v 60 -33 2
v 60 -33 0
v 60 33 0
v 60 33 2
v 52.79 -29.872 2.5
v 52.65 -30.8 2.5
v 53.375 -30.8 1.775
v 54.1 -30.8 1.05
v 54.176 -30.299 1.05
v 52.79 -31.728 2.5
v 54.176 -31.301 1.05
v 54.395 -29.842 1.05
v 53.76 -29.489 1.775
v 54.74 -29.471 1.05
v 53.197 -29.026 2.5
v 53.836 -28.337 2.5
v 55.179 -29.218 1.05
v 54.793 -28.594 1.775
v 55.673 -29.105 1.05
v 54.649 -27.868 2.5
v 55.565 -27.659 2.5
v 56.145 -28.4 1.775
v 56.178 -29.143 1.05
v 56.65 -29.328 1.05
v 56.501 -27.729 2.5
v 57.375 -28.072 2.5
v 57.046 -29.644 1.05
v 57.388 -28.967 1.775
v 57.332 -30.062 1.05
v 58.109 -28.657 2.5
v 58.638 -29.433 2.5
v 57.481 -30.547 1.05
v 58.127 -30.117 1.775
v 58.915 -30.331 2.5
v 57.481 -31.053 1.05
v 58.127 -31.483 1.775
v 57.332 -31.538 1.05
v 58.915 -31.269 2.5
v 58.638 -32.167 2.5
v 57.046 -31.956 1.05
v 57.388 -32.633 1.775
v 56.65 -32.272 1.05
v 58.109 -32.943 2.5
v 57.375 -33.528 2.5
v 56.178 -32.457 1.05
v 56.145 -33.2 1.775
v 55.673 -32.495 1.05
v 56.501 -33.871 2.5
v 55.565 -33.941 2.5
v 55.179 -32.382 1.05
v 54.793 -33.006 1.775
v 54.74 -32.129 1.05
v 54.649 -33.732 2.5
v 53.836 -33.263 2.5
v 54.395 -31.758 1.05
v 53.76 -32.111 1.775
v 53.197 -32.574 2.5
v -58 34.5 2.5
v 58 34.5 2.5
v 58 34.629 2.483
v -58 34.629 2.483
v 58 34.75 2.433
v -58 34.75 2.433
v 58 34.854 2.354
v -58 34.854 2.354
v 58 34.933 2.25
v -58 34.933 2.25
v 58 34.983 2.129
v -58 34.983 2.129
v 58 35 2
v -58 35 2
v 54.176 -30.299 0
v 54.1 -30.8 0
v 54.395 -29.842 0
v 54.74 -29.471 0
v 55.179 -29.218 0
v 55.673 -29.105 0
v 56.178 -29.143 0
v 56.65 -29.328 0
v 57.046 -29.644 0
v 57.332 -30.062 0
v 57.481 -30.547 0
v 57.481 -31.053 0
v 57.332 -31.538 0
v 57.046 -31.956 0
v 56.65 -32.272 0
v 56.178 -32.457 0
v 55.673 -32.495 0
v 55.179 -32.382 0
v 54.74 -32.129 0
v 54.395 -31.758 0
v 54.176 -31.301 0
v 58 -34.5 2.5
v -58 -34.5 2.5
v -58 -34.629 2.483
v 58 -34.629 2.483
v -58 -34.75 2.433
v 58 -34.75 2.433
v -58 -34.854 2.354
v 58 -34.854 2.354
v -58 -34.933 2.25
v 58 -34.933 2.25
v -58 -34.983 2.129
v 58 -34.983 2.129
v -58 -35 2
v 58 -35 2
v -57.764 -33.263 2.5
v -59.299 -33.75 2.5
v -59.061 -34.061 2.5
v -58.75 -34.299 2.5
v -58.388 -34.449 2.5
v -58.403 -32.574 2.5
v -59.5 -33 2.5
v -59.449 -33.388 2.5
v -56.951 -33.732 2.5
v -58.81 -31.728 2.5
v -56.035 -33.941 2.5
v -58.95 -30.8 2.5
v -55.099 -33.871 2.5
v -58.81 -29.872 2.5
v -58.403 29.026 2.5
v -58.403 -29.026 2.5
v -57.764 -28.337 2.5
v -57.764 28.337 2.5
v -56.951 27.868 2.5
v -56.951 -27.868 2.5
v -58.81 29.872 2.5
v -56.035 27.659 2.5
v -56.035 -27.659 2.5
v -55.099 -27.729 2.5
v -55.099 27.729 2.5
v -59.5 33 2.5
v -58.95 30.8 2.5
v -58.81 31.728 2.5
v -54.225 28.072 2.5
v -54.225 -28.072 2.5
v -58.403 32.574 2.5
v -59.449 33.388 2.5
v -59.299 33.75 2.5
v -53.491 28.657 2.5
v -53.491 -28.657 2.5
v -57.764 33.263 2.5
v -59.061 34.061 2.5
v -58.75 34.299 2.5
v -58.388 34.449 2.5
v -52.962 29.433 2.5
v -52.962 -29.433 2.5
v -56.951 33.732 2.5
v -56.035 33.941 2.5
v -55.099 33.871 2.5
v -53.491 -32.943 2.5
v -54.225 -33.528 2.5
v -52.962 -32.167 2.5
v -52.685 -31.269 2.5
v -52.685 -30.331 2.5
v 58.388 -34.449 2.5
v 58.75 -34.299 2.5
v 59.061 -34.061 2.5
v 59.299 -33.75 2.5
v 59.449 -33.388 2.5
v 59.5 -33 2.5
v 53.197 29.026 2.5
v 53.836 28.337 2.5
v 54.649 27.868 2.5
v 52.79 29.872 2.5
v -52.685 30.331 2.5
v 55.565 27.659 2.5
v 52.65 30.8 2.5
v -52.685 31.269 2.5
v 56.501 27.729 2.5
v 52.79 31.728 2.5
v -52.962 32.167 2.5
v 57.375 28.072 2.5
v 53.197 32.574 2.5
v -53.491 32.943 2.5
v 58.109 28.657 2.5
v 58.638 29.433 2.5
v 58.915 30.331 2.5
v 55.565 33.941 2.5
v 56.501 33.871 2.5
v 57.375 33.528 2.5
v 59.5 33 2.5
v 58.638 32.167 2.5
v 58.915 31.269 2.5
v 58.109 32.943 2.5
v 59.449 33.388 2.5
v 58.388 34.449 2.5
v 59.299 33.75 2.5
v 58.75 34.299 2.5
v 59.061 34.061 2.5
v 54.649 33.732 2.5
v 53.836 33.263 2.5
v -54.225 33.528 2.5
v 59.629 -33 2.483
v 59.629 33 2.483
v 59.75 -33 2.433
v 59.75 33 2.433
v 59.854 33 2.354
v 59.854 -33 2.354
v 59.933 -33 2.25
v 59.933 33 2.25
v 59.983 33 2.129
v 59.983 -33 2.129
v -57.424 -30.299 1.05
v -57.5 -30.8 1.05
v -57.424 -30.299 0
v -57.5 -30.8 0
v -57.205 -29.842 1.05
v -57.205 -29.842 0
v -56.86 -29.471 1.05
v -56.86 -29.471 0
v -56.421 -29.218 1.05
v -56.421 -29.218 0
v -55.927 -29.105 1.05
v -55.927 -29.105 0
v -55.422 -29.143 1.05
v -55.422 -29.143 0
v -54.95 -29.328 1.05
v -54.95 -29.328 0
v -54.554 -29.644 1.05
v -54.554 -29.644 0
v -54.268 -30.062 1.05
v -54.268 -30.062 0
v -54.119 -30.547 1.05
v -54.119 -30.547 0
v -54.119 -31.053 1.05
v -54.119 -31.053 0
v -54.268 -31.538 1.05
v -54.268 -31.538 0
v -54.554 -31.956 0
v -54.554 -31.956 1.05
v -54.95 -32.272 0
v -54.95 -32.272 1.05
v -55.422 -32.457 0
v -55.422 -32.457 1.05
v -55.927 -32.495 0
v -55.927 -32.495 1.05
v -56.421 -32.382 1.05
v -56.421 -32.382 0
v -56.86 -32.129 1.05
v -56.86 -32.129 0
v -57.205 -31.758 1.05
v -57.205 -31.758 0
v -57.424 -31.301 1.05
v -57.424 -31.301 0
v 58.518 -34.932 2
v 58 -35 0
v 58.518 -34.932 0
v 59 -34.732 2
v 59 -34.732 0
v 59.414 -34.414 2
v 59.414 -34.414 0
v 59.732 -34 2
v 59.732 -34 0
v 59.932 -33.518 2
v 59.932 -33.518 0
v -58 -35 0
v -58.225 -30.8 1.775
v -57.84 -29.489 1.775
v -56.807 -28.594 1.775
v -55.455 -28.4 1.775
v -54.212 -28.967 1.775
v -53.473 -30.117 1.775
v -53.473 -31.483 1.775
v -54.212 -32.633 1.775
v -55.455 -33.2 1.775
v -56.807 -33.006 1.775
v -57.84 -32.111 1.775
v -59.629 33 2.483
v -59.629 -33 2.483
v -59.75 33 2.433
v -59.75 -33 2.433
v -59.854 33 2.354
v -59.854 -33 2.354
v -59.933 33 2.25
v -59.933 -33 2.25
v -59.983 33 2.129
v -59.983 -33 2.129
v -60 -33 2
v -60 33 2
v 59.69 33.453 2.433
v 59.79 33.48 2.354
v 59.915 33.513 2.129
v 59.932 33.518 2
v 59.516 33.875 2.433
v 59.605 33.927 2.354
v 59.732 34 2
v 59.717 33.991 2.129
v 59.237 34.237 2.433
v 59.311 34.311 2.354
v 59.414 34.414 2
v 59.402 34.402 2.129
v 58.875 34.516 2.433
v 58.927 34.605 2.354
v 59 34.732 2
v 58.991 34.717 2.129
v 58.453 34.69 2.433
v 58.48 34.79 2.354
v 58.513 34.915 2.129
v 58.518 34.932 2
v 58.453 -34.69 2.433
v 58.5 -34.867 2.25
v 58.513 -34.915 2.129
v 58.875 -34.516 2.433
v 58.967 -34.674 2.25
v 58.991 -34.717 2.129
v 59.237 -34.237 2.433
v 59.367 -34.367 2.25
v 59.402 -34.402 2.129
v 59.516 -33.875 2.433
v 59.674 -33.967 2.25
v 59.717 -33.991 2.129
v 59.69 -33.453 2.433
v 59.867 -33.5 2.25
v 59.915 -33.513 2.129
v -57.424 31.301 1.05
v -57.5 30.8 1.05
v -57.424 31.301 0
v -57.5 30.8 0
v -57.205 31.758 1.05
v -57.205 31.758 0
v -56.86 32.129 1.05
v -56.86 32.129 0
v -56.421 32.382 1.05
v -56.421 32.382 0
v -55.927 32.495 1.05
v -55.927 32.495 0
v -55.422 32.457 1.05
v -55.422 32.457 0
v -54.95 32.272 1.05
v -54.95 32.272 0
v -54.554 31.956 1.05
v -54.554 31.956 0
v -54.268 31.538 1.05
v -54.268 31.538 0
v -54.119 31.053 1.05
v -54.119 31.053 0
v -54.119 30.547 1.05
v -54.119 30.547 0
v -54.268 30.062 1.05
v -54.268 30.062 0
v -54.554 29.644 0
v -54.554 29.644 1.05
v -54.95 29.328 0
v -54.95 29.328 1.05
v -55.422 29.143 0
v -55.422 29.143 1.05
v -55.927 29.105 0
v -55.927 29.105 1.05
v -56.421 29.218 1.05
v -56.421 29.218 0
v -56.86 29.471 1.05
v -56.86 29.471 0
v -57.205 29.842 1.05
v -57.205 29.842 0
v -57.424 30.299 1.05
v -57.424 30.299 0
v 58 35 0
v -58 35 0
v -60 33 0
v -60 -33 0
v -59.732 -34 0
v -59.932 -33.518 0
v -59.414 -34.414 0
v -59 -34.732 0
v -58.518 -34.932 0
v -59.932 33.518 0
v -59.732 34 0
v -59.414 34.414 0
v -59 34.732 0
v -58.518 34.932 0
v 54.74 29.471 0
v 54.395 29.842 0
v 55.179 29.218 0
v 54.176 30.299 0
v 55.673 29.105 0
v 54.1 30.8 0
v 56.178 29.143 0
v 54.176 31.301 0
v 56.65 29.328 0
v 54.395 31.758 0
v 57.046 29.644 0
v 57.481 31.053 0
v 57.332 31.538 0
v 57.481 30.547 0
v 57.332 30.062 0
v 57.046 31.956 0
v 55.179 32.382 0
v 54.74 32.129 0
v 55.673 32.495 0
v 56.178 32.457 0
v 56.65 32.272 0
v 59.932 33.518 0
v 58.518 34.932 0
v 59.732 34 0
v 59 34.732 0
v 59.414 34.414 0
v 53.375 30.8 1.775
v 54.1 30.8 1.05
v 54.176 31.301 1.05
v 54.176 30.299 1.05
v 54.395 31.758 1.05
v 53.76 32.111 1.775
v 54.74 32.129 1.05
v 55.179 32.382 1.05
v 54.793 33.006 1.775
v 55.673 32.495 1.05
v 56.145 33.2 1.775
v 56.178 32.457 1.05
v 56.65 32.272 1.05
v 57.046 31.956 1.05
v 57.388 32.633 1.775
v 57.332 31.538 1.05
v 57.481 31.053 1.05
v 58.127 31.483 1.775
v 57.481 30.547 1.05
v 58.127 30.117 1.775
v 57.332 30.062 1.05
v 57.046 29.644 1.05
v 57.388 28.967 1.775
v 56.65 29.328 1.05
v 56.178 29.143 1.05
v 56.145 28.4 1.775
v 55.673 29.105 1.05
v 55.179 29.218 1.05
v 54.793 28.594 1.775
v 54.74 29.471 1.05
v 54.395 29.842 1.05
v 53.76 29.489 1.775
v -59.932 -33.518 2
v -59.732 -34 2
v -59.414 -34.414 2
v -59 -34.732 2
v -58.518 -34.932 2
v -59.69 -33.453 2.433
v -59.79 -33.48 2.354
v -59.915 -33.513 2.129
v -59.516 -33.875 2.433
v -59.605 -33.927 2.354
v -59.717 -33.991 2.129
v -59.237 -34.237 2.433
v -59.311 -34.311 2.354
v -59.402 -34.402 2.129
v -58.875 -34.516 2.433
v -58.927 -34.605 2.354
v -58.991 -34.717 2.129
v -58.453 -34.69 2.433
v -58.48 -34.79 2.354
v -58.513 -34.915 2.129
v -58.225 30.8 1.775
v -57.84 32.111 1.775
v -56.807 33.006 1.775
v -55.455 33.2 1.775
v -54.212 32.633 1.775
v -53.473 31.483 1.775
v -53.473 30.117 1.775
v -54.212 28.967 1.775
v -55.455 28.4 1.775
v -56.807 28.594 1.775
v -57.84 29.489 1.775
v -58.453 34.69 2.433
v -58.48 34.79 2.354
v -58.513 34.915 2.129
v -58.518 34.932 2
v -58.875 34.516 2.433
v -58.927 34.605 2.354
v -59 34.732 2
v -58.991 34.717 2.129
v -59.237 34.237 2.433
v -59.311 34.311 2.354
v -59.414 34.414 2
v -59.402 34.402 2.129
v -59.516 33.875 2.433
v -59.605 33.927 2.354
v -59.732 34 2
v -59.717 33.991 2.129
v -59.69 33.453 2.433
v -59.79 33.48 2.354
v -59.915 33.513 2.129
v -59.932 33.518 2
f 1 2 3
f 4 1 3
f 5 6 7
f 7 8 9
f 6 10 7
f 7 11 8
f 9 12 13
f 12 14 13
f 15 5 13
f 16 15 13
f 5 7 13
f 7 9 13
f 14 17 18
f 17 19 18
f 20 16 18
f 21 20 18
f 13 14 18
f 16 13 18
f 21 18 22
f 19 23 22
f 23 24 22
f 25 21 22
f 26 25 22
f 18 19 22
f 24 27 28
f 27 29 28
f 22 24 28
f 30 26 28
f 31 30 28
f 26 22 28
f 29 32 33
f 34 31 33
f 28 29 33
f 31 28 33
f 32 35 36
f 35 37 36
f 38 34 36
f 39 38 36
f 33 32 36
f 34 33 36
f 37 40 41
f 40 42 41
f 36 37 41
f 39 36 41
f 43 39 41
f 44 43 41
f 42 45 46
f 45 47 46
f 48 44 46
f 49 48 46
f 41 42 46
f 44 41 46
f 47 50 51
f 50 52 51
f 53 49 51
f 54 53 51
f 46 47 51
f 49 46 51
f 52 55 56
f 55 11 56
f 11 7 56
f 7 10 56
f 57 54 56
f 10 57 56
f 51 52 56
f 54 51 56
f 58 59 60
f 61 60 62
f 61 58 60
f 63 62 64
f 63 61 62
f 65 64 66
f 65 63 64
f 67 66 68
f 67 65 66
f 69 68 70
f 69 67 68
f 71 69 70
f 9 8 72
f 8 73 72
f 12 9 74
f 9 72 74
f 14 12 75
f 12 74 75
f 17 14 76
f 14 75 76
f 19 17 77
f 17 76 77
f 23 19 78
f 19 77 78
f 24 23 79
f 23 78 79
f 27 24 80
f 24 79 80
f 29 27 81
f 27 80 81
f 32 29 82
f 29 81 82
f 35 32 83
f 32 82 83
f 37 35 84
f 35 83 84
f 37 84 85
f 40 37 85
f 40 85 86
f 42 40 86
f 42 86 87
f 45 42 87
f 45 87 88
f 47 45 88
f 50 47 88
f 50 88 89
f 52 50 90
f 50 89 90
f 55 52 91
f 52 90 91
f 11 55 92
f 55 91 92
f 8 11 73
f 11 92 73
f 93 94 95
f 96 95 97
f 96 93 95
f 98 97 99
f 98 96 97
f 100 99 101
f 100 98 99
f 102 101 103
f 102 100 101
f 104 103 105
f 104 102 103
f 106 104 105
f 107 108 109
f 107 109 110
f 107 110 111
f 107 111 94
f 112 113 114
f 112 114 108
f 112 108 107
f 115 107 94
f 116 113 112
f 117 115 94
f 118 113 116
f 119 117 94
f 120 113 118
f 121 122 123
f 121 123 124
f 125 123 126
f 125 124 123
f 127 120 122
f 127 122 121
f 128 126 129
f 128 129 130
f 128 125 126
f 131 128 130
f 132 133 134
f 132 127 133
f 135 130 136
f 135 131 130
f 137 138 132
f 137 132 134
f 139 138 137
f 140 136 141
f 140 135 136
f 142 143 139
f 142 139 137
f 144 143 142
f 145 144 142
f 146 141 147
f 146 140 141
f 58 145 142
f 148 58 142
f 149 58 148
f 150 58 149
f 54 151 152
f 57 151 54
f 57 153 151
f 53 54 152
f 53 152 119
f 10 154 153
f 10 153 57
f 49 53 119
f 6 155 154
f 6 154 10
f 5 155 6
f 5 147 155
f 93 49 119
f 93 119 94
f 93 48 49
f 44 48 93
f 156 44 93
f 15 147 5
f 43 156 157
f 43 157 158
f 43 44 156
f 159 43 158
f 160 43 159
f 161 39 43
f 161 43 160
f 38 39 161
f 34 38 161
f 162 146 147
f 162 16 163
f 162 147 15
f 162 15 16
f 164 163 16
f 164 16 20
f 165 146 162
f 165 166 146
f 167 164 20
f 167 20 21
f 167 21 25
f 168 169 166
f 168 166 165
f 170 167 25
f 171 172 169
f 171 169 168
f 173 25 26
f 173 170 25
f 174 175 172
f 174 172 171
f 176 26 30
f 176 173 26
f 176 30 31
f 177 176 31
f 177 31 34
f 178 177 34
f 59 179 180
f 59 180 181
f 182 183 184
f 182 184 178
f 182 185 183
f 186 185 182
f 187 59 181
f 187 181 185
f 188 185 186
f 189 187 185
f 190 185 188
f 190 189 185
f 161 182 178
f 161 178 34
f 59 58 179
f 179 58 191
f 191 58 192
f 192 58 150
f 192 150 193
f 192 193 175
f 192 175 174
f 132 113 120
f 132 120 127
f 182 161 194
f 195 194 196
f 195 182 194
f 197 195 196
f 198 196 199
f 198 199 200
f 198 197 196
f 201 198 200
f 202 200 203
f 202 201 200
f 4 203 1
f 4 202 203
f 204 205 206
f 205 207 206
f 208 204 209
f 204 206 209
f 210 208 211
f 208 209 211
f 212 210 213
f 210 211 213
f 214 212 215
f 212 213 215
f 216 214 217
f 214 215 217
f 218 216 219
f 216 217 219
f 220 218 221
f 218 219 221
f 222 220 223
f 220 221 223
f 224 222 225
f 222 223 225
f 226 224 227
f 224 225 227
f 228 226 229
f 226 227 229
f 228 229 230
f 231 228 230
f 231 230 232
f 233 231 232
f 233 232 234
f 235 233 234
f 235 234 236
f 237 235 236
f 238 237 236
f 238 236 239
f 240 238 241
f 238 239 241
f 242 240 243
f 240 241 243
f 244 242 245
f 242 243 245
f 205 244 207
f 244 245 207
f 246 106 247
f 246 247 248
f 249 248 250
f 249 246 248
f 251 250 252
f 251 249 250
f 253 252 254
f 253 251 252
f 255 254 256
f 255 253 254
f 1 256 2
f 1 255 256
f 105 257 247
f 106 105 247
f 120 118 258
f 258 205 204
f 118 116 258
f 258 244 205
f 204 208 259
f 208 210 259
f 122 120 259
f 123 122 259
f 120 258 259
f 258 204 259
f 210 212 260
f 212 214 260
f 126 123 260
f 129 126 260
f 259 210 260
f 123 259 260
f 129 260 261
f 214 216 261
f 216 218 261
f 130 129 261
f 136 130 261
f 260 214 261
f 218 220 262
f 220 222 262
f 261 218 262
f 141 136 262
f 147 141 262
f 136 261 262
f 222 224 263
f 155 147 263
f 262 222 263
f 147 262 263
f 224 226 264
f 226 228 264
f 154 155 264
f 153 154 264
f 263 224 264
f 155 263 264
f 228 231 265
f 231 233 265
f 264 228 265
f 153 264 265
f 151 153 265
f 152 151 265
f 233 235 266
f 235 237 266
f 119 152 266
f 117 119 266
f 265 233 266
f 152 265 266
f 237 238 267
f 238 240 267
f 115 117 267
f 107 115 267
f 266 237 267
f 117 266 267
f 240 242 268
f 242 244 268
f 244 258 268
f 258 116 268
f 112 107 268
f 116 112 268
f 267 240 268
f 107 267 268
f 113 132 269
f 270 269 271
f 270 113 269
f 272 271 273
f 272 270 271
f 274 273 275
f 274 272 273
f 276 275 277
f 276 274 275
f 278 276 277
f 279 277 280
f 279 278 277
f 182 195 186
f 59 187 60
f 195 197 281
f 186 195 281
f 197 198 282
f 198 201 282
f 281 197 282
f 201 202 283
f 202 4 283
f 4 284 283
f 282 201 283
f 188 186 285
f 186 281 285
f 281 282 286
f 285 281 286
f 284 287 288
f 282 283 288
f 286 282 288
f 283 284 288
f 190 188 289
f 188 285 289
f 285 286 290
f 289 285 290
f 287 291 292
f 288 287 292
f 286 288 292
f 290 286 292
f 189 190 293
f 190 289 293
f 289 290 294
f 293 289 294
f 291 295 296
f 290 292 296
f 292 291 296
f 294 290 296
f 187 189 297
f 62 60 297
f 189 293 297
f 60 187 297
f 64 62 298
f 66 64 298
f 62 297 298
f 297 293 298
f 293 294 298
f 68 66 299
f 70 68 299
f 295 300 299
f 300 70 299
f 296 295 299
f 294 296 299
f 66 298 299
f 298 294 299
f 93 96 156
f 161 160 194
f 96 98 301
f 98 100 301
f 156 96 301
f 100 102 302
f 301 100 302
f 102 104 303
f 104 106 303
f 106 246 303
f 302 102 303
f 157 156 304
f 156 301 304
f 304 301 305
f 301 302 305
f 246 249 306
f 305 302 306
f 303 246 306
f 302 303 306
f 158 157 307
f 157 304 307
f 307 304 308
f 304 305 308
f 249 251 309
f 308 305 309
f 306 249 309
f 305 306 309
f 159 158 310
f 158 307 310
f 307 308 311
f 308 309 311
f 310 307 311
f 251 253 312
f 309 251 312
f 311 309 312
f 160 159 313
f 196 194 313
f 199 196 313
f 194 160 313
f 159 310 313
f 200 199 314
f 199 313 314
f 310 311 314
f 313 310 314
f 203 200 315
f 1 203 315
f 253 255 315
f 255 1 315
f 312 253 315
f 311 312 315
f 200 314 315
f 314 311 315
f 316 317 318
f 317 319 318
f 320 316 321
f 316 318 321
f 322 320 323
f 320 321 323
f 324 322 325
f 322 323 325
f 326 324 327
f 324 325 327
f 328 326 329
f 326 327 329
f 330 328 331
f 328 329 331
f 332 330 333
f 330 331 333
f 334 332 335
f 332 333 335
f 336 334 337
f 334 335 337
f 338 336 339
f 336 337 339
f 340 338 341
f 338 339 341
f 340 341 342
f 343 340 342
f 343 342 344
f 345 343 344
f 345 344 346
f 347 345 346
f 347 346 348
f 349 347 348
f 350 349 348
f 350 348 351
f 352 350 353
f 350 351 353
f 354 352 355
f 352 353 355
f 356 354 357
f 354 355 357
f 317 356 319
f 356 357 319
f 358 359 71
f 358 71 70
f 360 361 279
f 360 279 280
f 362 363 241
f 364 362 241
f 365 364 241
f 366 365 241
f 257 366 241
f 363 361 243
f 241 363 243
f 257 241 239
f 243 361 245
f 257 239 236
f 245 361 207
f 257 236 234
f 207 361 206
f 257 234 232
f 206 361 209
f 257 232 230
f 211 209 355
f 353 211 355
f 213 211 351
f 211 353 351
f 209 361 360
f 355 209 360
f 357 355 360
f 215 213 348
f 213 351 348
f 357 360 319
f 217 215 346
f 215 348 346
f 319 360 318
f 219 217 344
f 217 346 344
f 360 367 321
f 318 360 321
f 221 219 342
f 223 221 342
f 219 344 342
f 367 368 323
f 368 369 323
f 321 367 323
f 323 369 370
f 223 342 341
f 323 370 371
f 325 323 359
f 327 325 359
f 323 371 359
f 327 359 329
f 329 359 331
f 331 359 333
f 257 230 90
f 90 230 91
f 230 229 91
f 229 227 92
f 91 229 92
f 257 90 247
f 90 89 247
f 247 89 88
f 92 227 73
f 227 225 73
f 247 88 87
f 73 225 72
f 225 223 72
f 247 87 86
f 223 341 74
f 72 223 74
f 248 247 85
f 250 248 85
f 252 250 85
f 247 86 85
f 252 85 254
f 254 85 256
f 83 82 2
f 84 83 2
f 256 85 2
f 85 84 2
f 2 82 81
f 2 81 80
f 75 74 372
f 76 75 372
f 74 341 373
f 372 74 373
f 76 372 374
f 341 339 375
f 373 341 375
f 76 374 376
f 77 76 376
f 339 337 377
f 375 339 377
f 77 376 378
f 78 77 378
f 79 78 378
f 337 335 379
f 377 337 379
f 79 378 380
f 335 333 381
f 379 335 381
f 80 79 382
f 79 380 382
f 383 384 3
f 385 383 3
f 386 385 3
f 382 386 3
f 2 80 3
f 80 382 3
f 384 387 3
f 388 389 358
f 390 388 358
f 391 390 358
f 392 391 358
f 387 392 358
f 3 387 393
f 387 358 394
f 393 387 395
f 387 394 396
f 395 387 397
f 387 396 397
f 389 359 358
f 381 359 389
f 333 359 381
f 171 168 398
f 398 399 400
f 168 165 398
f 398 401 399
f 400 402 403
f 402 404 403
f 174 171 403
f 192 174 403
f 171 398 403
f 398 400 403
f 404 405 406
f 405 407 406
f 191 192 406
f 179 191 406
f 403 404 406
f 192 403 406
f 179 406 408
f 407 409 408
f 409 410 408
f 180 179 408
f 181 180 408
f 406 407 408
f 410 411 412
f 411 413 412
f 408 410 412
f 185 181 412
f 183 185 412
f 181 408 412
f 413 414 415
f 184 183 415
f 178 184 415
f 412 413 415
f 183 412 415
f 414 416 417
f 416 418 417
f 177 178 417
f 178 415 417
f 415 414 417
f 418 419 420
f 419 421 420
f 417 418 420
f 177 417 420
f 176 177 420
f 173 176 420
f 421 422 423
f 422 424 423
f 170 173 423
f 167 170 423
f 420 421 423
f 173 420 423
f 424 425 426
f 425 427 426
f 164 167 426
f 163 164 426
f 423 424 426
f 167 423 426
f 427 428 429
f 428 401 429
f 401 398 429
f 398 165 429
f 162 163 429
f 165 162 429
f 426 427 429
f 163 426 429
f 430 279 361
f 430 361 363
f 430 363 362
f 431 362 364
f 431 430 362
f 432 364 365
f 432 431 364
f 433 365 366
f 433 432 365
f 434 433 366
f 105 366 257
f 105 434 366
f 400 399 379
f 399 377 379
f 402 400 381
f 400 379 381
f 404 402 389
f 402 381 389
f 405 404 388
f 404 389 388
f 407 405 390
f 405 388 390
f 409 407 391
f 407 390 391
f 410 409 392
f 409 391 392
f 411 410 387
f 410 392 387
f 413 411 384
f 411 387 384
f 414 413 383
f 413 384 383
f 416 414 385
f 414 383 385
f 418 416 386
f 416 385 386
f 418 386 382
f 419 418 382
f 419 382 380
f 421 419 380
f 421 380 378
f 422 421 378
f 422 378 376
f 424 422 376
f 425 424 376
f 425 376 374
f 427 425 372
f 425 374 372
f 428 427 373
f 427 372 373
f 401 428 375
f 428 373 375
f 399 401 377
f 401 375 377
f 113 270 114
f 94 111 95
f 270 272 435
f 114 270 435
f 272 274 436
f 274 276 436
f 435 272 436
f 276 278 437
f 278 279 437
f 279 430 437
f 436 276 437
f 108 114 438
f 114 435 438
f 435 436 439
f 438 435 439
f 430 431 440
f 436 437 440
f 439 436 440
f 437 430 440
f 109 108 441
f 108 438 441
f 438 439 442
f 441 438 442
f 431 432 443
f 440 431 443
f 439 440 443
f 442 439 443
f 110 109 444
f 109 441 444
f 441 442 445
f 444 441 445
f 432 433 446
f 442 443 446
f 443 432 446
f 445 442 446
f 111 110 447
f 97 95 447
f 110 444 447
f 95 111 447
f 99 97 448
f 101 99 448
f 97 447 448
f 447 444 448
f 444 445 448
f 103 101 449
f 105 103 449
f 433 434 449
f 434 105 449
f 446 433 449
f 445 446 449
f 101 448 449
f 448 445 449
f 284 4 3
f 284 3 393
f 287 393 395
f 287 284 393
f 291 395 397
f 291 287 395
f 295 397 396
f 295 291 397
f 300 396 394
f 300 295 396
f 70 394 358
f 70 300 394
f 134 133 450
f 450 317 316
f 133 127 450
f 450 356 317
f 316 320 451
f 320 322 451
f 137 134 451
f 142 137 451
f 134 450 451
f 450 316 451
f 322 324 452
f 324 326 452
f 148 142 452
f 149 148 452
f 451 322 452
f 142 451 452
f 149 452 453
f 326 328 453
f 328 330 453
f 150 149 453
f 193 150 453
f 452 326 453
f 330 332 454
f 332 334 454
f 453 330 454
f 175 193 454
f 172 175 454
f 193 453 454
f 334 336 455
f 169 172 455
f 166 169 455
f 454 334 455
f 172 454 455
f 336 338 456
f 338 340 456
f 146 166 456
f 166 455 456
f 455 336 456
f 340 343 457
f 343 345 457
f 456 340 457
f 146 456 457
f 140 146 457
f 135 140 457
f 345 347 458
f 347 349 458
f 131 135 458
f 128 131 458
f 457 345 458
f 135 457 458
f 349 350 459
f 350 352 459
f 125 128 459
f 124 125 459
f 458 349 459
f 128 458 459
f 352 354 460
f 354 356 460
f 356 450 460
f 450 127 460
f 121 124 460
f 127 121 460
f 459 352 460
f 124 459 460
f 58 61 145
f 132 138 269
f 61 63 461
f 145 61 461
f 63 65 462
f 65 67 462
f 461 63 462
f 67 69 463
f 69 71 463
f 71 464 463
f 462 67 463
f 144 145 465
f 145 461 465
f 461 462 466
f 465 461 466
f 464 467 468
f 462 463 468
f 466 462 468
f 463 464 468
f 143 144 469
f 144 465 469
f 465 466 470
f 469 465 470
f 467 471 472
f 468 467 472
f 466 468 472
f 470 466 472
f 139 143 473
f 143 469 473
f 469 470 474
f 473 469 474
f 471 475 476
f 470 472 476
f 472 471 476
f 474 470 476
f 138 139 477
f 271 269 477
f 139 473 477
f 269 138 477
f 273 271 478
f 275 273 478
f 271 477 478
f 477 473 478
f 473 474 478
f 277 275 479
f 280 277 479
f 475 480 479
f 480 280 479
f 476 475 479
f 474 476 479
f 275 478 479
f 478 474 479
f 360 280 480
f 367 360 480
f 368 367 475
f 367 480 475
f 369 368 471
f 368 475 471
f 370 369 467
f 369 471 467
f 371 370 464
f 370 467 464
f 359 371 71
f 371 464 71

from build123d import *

# Parameters (mm, degrees)
SKETCH1_W                                           = 120
SKETCH1_H                                           = 70
BOSS_EXTRUDE1_DEPTH                                 = 2.5
FILLET1_R                                           = 2
CSK_FOR_M3_COUNTERSUNK_FLAT_HEAD_SCREW1_D           = 3.4
CSK_FOR_M3_COUNTERSUNK_FLAT_HEAD_SCREW1_DEPTH       = 10
CSK_FOR_M3_COUNTERSUNK_FLAT_HEAD_SCREW1_CSINK_D     = 6.3
CSK_FOR_M3_COUNTERSUNK_FLAT_HEAD_SCREW1_CSINK_ANGLE = 90
CSK_FOR_M3_COUNTERSUNK_FLAT_HEAD_SCREW1_TIP         = 1.021463052
FILLET2_R                                           = 0.5


with BuildPart() as part:
    # Sketch1 → Boss-Extrude1 (new body)
    with BuildSketch(Plane.XY):
        Rectangle(SKETCH1_W, SKETCH1_H)
    extrude(amount=BOSS_EXTRUDE1_DEPTH)

    # Fillet1
    fillet1_edges = [part.edges().sort_by_distance(p)[0] for p in [
        (-60, 35, 1.25),
        (60, 35, 1.25),
        (60, -35, 1.25),
        (-60, -35, 1.25),
    ]]
    fillet(fillet1_edges, radius=FILLET1_R)

    # CSK for M3 Countersunk Flat Head Screw1
    with Locations(Plane(origin=(-55.8, 30.8, 2.5), x_dir=(1, 0, 0), z_dir=(0, 0, 1))):
        with Locations((0, 0), (111.6, 0), (111.6, -61.6), (0, -61.6)):
            CounterSinkHole(CSK_FOR_M3_COUNTERSUNK_FLAT_HEAD_SCREW1_D / 2, CSK_FOR_M3_COUNTERSUNK_FLAT_HEAD_SCREW1_CSINK_D / 2, depth=CSK_FOR_M3_COUNTERSUNK_FLAT_HEAD_SCREW1_DEPTH, counter_sink_angle=CSK_FOR_M3_COUNTERSUNK_FLAT_HEAD_SCREW1_CSINK_ANGLE)
            with Locations((0, 0, -(CSK_FOR_M3_COUNTERSUNK_FLAT_HEAD_SCREW1_DEPTH + CSK_FOR_M3_COUNTERSUNK_FLAT_HEAD_SCREW1_TIP / 2))):  # 118° drill point
                Cone(0, CSK_FOR_M3_COUNTERSUNK_FLAT_HEAD_SCREW1_D / 2, CSK_FOR_M3_COUNTERSUNK_FLAT_HEAD_SCREW1_TIP, mode=Mode.SUBTRACT)

    # Fillet2
    fillet2_edges = [part.edges().sort_by_distance(p)[0] for p in [
        (60, 0, 2.5),
        (0, -35, 2.5),
        (-60, 0, 2.5),
        (0, 35, 2.5),
        (59.414213562, 34.414213562, 2.5),
        (-59.414213562, 34.414213562, 2.5),
        (-59.414213562, -34.414213562, 2.5),
        (59.414213562, -34.414213562, 2.5),
    ]]
    fillet(fillet2_edges, radius=FILLET2_R)


solid = part.part
